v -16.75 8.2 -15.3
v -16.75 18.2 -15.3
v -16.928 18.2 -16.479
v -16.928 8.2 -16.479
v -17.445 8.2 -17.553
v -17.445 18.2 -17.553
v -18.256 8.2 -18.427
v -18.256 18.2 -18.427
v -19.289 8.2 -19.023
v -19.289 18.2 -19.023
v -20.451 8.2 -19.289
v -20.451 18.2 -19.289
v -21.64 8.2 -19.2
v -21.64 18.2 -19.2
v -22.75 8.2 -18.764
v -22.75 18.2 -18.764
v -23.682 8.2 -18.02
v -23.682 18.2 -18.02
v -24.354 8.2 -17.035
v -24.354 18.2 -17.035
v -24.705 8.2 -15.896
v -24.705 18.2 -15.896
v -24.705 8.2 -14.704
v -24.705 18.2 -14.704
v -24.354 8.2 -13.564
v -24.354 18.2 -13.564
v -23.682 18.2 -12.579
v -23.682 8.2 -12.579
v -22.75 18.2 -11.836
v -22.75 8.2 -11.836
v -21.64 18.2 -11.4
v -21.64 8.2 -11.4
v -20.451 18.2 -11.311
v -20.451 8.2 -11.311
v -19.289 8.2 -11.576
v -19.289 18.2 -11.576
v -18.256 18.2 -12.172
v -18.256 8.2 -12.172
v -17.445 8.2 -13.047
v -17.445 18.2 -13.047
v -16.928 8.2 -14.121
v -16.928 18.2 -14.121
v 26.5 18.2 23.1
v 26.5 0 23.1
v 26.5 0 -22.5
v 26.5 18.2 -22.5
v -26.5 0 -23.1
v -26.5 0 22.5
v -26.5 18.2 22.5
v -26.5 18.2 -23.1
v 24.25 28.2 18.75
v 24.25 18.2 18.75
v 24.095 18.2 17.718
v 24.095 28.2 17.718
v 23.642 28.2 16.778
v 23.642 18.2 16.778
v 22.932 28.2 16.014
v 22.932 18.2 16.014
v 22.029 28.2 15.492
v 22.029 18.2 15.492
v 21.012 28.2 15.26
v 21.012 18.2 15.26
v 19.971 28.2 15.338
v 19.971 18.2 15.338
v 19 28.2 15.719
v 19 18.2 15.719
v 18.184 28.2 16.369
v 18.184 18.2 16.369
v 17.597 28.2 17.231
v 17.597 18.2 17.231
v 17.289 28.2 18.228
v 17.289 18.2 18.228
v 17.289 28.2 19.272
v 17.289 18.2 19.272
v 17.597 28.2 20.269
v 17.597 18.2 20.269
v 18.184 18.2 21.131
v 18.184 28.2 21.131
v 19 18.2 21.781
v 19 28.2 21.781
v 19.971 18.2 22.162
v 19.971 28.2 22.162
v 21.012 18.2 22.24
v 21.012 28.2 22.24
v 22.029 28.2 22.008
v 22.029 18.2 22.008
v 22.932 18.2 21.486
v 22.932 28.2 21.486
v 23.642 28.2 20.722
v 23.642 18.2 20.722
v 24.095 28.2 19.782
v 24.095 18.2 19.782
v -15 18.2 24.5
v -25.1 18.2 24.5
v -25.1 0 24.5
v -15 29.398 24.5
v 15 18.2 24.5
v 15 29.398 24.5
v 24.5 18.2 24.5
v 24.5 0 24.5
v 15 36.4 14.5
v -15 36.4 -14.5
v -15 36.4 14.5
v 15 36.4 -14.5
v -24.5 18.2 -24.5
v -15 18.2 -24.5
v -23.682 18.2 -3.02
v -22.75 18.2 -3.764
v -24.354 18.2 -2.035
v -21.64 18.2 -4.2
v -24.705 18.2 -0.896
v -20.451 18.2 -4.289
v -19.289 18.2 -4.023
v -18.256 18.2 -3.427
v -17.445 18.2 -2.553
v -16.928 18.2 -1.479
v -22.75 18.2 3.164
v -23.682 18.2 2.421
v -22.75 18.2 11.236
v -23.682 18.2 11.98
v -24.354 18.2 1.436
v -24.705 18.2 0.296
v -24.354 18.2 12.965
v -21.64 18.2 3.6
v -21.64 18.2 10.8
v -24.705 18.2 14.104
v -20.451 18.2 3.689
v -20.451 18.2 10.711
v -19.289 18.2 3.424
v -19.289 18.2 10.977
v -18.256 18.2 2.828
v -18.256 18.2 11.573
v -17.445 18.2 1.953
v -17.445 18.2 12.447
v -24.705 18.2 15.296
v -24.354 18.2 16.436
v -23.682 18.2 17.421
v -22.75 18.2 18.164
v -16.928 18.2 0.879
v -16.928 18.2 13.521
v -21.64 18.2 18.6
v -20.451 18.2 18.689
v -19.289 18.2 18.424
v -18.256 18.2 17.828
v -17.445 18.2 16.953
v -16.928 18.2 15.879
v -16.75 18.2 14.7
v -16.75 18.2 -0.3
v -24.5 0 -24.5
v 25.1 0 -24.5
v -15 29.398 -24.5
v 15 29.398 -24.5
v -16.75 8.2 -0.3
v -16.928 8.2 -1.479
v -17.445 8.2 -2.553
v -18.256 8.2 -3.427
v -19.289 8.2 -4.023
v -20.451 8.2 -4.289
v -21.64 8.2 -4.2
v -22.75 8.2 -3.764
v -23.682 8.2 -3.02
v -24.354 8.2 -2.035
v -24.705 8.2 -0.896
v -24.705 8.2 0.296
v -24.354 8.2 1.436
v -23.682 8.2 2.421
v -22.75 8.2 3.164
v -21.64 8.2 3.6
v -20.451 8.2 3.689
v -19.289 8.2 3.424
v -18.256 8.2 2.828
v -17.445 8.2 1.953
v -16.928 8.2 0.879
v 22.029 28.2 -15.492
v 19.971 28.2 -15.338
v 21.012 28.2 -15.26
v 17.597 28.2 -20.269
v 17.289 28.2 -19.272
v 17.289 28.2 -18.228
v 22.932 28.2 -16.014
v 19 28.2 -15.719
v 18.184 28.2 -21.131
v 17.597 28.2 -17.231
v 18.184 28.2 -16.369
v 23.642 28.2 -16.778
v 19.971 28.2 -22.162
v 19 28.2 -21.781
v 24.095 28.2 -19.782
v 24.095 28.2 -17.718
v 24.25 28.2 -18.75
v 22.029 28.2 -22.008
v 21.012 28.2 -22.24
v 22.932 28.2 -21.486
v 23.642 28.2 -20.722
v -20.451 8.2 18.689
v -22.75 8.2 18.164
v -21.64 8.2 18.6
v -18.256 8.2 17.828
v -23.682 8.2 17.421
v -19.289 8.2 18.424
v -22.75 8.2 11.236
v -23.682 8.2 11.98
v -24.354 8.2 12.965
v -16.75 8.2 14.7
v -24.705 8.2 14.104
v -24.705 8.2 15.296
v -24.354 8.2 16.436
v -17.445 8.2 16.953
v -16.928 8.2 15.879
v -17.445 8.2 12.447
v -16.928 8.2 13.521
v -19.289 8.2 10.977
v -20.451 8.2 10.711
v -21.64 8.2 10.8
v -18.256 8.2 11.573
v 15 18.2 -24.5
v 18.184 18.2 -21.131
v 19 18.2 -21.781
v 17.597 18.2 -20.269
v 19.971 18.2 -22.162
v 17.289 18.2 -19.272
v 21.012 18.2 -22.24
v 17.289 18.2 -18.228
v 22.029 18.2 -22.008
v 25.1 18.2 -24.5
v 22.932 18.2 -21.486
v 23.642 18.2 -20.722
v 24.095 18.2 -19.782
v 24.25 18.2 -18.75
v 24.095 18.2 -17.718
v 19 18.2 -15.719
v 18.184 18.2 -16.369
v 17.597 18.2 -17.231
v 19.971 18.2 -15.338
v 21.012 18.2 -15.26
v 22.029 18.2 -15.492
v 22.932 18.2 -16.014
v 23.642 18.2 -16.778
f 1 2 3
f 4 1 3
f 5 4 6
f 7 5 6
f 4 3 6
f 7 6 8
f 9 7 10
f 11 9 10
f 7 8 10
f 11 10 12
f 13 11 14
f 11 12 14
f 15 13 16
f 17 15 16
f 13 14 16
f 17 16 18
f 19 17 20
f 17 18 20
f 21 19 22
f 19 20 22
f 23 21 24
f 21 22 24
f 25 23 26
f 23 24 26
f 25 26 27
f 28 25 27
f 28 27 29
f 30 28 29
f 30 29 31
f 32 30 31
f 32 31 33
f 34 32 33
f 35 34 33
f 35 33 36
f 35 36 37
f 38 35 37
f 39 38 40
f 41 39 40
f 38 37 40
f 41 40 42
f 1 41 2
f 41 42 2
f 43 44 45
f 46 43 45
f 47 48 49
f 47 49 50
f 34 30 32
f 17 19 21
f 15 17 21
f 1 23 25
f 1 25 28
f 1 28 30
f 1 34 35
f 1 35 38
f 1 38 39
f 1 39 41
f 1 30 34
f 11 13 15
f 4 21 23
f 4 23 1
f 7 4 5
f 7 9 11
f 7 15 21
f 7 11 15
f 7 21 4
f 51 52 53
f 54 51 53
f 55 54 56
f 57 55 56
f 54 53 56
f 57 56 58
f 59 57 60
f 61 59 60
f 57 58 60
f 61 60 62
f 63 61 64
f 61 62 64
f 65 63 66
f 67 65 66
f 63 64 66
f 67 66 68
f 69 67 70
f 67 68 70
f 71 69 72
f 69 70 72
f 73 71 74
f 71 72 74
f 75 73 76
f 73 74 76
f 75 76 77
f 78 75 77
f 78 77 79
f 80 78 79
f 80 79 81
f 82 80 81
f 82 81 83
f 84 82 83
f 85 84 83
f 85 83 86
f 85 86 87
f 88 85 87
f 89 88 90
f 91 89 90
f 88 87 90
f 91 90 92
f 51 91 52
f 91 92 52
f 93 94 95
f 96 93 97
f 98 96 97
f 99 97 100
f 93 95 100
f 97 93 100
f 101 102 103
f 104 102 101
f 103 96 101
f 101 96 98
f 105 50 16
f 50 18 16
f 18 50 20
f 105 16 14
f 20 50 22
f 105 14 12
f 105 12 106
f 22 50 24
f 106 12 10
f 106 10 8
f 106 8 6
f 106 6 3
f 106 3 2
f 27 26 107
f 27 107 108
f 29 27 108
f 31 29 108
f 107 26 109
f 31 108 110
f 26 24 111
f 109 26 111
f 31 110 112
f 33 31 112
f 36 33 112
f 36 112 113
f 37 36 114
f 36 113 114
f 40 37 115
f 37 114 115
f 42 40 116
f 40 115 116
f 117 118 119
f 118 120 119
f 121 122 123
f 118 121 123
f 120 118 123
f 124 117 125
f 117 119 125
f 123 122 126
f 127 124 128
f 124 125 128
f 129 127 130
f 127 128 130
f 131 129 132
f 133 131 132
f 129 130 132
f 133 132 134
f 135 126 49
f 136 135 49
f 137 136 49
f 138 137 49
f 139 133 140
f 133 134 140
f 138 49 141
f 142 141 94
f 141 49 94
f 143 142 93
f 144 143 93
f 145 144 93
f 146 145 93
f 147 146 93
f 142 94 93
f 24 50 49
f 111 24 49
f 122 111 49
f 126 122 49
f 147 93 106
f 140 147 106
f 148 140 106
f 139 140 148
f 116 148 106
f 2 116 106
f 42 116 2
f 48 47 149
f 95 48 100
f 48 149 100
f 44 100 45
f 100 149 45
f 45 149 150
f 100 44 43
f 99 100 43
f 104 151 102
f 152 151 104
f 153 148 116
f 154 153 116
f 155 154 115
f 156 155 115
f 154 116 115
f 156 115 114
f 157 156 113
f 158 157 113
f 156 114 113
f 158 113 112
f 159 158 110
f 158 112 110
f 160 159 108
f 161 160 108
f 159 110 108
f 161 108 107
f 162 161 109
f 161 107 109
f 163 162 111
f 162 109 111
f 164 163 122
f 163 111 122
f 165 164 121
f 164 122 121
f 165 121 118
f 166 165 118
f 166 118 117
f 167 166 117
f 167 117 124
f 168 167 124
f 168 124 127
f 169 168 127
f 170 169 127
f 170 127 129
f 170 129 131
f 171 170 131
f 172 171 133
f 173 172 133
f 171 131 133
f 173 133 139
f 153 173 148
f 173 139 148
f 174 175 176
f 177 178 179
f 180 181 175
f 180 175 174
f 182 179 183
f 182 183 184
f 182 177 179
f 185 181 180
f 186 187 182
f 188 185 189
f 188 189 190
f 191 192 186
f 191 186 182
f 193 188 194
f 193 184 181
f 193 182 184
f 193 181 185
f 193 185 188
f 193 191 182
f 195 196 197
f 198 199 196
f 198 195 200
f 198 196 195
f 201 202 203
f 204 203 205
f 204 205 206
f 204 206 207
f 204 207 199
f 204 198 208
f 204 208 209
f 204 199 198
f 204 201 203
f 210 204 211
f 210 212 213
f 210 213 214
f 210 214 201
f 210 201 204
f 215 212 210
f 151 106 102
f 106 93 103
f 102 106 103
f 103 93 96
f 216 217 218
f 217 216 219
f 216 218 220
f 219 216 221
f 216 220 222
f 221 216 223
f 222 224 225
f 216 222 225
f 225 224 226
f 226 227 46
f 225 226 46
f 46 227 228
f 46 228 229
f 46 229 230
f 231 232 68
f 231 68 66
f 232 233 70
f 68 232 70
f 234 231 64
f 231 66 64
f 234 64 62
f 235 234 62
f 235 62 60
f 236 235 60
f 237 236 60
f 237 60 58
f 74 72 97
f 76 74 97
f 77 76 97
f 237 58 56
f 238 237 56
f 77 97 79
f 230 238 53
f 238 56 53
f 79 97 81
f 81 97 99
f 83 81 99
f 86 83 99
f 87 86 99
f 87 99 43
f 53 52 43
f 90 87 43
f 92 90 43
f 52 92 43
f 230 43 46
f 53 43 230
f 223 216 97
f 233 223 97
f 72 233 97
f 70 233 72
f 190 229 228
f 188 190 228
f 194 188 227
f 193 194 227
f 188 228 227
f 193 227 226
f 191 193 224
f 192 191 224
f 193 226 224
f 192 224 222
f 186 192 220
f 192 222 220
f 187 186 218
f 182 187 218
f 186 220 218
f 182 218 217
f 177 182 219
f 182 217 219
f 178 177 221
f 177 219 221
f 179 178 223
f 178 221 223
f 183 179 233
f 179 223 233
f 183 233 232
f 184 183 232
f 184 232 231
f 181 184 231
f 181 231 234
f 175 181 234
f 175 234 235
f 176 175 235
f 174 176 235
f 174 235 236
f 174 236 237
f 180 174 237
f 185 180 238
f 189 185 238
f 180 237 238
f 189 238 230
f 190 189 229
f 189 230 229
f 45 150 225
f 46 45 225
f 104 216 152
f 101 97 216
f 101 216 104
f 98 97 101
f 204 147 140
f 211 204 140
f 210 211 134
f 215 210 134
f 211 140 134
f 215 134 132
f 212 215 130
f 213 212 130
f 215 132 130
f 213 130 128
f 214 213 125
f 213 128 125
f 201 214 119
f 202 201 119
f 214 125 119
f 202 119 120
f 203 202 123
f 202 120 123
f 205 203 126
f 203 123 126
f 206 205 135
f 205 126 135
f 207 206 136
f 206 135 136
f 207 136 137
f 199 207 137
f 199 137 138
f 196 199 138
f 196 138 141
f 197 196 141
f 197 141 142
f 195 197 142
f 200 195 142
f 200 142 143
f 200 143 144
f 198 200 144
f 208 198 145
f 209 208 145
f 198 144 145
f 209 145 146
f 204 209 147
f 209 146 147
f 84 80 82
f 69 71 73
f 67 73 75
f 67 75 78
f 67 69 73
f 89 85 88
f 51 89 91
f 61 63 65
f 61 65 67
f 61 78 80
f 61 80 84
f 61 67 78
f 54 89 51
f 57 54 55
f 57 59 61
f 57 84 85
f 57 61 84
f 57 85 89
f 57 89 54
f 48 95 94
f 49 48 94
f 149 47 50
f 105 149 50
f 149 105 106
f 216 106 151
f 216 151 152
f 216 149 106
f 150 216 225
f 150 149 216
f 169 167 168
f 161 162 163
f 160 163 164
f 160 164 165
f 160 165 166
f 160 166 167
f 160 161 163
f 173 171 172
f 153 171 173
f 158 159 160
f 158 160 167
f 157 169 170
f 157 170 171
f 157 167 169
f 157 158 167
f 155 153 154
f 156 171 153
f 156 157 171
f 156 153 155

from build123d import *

# Parameters (mm, degrees)
SKETCH2_W             = 53
SKETCH2_H             = 49
BOSS_EXTRUDE1_DEPTH   = 36.4
SKETCH3_W             = 11.5
SKETCH3_H             = 18.2
CUT_EXTRUDE1_DEPTH    = 50
CHAMFER1_SIZE         = 10
CHAMFER1_SIZE2        = 7.002075382
CHAMFER2_SIZE         = 2
CHAMFER2_SIZE2        = 1.400415076
CHAMFER2_PART_2_SIZE  = 2
CHAMFER2_PART_2_SIZE2 = 1.400415076
CHAMFER2_PART_3_SIZE  = 2
CHAMFER2_PART_3_SIZE2 = 1.400415076
CHAMFER2_PART_4_SIZE  = 2
CHAMFER2_PART_4_SIZE2 = 1.400415076
SKETCH4_R             = 3.5
BOSS_EXTRUDE2_DEPTH   = 10
SKETCH5_R             = 4
CUT_EXTRUDE2_DEPTH    = 10


with BuildPart() as part:
    # Sketch2 → Boss-Extrude1 (new body)
    with BuildSketch(Plane(origin=(0, 0, 0), x_dir=(1, 0, 0), z_dir=(0, 1, 0))):
        Rectangle(SKETCH2_W, SKETCH2_H)
    extrude(amount=BOSS_EXTRUDE1_DEPTH)

    # Sketch3 → Cut-Extrude1 (cut, through all)
    with BuildSketch(Plane.XY.offset(24.5)):
        with Locations((-20.75, 27.3)):
            Rectangle(SKETCH3_W, SKETCH3_H)
        with Locations((20.75, 27.3)):
            Rectangle(SKETCH3_W, SKETCH3_H)
    extrude(amount=-CUT_EXTRUDE1_DEPTH, mode=Mode.SUBTRACT)

    # Chamfer1
    chamfer1_edges = [part.edges().sort_by_distance(p)[0] for p in [
        (0, 36.4, 24.5),
        (0, 36.4, -24.5),
    ]]
    chamfer1_side = [part.faces().sort_by_distance(p)[0] for p in [
        (0, 36.4, 0),
    ]]
    chamfer(chamfer1_edges, length=CHAMFER1_SIZE, length2=CHAMFER1_SIZE2, reference=chamfer1_side[0])

    # Chamfer2
    chamfer2_edges = [part.edges().sort_by_distance(p)[0] for p in [
        (-26.5, 9.1, -24.5),
    ]]
    chamfer2_side = [part.faces().sort_by_distance(p)[0] for p in [
        (0, 12.896841884, -24.5),
    ]]
    chamfer(chamfer2_edges, length=CHAMFER2_SIZE, length2=CHAMFER2_SIZE2, reference=chamfer2_side[0])

    # Chamfer2 part 2
    chamfer2_part_2_edges = [part.edges().sort_by_distance(p)[0] for p in [
        (26.5, 9.1, -24.5),
    ]]
    chamfer2_part_2_side = [part.faces().sort_by_distance(p)[0] for p in [
        (26.5, 9.1, 0),
    ]]
    chamfer(chamfer2_part_2_edges, length=CHAMFER2_PART_2_SIZE, length2=CHAMFER2_PART_2_SIZE2, reference=chamfer2_part_2_side[0])

    # Chamfer2 part 3
    chamfer2_part_3_edges = [part.edges().sort_by_distance(p)[0] for p in [
        (26.5, 9.1, 24.5),
    ]]
    chamfer2_part_3_side = [part.faces().sort_by_distance(p)[0] for p in [
        (0, 12.896841884, 24.5),
    ]]
    chamfer(chamfer2_part_3_edges, length=CHAMFER2_PART_3_SIZE, length2=CHAMFER2_PART_3_SIZE2, reference=chamfer2_part_3_side[0])

    # Chamfer2 part 4
    chamfer2_part_4_edges = [part.edges().sort_by_distance(p)[0] for p in [
        (-26.5, 9.1, 24.5),
    ]]
    chamfer2_part_4_side = [part.faces().sort_by_distance(p)[0] for p in [
        (-26.5, 9.1, 0),
    ]]
    chamfer(chamfer2_part_4_edges, length=CHAMFER2_PART_4_SIZE, length2=CHAMFER2_PART_4_SIZE2, reference=chamfer2_part_4_side[0])

    # Sketch4 → Boss-Extrude2 (add)
    with BuildSketch(Plane(origin=(0, 18.2, 0), x_dir=(1, 0, 0), z_dir=(0, 1, 0))):
        with Locations((20.75, -18.75)):
            Circle(SKETCH4_R)
        with Locations((20.75, 18.75)):
            Circle(SKETCH4_R)
    extrude(amount=BOSS_EXTRUDE2_DEPTH)

    # Sketch5 → Cut-Extrude2 (cut)
    with BuildSketch(Plane(origin=(0, 18.2, 0), x_dir=(1, 0, 0), z_dir=(0, 1, 0))):
        with Locations((-20.75, 15.299792462)):
            Circle(SKETCH5_R)
        with Locations((-20.75, -14.700207538)):
            Circle(SKETCH5_R)
        with Locations((-20.75, 0.299792462)):
            Circle(SKETCH5_R)
    extrude(amount=-CUT_EXTRUDE2_DEPTH, mode=Mode.SUBTRACT)


solid = part.part
